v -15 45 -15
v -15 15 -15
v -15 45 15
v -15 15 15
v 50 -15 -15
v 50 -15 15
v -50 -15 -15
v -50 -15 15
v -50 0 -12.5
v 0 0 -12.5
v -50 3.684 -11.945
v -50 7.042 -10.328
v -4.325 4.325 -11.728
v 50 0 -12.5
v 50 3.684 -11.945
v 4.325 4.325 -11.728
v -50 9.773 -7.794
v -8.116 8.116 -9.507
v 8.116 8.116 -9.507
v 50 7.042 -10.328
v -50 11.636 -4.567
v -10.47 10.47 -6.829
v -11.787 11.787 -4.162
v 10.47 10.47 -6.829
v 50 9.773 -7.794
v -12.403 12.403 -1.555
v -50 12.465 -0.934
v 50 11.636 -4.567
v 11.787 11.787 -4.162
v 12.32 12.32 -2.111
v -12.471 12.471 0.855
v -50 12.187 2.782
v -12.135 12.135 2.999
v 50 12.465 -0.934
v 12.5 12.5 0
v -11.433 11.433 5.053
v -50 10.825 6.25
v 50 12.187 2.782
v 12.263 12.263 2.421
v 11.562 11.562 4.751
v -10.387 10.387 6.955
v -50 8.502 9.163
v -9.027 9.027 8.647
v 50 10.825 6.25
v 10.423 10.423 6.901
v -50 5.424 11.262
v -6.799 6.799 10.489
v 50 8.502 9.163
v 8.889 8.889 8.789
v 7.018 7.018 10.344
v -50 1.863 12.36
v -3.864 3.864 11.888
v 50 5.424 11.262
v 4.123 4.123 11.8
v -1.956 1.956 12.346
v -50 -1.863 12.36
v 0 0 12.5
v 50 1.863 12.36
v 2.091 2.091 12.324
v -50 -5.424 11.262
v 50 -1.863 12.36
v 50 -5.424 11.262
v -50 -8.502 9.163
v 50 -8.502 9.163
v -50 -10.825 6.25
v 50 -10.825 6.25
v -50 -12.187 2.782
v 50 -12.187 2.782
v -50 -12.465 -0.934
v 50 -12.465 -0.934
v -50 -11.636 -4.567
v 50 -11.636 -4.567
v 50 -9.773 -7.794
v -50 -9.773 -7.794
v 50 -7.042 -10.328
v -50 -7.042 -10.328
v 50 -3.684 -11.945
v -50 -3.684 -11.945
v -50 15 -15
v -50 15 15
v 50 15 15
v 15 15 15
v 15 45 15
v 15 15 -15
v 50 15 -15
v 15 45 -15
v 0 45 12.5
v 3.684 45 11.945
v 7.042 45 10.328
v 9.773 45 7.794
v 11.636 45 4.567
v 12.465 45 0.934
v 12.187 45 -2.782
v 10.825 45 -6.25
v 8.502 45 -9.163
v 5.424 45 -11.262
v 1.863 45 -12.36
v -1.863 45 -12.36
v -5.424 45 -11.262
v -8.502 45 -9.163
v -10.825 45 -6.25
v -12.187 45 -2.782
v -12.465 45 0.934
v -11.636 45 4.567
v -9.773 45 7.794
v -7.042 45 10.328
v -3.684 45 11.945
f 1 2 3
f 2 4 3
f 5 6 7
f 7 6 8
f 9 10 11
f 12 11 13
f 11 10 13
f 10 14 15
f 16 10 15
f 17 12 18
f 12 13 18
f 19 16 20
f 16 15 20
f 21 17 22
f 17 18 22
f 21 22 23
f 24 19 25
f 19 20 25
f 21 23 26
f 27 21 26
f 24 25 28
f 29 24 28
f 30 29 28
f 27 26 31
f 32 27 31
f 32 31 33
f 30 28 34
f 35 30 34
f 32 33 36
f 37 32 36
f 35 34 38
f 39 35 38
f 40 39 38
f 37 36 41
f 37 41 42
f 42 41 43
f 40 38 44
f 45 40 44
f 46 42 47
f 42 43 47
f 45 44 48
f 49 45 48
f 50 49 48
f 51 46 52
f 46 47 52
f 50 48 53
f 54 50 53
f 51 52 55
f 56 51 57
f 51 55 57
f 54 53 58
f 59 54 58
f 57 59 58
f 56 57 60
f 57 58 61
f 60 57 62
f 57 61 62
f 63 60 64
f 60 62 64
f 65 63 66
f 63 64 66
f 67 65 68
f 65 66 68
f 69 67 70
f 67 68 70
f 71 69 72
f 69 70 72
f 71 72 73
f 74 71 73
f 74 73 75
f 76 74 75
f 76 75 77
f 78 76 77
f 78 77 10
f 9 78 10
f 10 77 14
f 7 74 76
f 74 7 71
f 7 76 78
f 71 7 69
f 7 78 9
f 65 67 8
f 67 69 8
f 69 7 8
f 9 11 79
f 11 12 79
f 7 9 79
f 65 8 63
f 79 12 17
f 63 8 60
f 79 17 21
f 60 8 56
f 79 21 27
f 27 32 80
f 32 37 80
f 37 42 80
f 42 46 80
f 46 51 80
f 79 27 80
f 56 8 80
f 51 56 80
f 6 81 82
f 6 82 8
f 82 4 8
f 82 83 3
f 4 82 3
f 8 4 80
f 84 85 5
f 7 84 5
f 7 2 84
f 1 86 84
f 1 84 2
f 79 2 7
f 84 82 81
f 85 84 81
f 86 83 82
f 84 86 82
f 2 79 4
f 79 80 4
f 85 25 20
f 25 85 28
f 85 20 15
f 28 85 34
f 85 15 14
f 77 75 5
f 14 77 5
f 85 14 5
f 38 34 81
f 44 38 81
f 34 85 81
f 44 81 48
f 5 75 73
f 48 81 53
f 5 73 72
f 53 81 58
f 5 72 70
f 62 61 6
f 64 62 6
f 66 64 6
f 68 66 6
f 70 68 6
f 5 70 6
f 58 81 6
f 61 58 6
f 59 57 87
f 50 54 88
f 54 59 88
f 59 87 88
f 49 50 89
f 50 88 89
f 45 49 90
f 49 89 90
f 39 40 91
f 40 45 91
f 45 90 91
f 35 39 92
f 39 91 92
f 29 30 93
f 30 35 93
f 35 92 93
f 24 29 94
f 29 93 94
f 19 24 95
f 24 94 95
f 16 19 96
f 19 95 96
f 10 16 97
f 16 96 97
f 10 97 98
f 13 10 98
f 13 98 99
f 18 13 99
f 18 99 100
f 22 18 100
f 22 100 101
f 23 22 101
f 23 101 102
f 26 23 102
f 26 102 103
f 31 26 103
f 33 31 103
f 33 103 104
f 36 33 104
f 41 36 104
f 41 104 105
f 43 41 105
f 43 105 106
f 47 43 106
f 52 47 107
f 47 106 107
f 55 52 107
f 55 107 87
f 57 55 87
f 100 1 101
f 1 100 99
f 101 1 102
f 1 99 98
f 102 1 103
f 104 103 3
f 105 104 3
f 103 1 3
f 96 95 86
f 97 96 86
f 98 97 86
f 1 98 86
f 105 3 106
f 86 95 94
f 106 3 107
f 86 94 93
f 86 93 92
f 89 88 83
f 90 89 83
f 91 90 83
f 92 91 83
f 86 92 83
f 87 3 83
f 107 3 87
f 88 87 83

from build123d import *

# Parameters (mm, degrees)
EXTRUDE_3_DEPTH     = 15
SKETCH_6_R          = 12.5
CUT_EXTRUDE_3_DEPTH = 100
SKETCH_7_R          = 12.5
CUT_EXTRUDE_4_DEPTH = 45


with BuildPart() as part:
    # 草图5 → 凸台-拉伸3 (new, symmetric)
    with BuildSketch(Plane.XY):
        Polygon((15, 15), (50, 15), (50, -15), (-50, -15), (-50, 15), (-15, 15), (-15, 45), (15, 45), align=None)
    extrude(amount=EXTRUDE_3_DEPTH, both=True)

    # 草图6 → 切除-拉伸3 (cut)
    with BuildSketch(Plane(origin=(50, 0, 0), x_dir=(0, 0, -1), z_dir=(1, 0, 0))):
        Circle(SKETCH_6_R)
    extrude(amount=-CUT_EXTRUDE_3_DEPTH, mode=Mode.SUBTRACT)

    # 草图7 → 切除-拉伸4 (cut)
    with BuildSketch(Plane(origin=(0, 45, 0), x_dir=(1, 0, 0), z_dir=(0, 1, 0))):
        with Locations(Location((0, 0, 0), (0, 0, 270))):
            Circle(SKETCH_7_R)
    extrude(amount=-CUT_EXTRUDE_4_DEPTH, mode=Mode.SUBTRACT)


solid = part.part
